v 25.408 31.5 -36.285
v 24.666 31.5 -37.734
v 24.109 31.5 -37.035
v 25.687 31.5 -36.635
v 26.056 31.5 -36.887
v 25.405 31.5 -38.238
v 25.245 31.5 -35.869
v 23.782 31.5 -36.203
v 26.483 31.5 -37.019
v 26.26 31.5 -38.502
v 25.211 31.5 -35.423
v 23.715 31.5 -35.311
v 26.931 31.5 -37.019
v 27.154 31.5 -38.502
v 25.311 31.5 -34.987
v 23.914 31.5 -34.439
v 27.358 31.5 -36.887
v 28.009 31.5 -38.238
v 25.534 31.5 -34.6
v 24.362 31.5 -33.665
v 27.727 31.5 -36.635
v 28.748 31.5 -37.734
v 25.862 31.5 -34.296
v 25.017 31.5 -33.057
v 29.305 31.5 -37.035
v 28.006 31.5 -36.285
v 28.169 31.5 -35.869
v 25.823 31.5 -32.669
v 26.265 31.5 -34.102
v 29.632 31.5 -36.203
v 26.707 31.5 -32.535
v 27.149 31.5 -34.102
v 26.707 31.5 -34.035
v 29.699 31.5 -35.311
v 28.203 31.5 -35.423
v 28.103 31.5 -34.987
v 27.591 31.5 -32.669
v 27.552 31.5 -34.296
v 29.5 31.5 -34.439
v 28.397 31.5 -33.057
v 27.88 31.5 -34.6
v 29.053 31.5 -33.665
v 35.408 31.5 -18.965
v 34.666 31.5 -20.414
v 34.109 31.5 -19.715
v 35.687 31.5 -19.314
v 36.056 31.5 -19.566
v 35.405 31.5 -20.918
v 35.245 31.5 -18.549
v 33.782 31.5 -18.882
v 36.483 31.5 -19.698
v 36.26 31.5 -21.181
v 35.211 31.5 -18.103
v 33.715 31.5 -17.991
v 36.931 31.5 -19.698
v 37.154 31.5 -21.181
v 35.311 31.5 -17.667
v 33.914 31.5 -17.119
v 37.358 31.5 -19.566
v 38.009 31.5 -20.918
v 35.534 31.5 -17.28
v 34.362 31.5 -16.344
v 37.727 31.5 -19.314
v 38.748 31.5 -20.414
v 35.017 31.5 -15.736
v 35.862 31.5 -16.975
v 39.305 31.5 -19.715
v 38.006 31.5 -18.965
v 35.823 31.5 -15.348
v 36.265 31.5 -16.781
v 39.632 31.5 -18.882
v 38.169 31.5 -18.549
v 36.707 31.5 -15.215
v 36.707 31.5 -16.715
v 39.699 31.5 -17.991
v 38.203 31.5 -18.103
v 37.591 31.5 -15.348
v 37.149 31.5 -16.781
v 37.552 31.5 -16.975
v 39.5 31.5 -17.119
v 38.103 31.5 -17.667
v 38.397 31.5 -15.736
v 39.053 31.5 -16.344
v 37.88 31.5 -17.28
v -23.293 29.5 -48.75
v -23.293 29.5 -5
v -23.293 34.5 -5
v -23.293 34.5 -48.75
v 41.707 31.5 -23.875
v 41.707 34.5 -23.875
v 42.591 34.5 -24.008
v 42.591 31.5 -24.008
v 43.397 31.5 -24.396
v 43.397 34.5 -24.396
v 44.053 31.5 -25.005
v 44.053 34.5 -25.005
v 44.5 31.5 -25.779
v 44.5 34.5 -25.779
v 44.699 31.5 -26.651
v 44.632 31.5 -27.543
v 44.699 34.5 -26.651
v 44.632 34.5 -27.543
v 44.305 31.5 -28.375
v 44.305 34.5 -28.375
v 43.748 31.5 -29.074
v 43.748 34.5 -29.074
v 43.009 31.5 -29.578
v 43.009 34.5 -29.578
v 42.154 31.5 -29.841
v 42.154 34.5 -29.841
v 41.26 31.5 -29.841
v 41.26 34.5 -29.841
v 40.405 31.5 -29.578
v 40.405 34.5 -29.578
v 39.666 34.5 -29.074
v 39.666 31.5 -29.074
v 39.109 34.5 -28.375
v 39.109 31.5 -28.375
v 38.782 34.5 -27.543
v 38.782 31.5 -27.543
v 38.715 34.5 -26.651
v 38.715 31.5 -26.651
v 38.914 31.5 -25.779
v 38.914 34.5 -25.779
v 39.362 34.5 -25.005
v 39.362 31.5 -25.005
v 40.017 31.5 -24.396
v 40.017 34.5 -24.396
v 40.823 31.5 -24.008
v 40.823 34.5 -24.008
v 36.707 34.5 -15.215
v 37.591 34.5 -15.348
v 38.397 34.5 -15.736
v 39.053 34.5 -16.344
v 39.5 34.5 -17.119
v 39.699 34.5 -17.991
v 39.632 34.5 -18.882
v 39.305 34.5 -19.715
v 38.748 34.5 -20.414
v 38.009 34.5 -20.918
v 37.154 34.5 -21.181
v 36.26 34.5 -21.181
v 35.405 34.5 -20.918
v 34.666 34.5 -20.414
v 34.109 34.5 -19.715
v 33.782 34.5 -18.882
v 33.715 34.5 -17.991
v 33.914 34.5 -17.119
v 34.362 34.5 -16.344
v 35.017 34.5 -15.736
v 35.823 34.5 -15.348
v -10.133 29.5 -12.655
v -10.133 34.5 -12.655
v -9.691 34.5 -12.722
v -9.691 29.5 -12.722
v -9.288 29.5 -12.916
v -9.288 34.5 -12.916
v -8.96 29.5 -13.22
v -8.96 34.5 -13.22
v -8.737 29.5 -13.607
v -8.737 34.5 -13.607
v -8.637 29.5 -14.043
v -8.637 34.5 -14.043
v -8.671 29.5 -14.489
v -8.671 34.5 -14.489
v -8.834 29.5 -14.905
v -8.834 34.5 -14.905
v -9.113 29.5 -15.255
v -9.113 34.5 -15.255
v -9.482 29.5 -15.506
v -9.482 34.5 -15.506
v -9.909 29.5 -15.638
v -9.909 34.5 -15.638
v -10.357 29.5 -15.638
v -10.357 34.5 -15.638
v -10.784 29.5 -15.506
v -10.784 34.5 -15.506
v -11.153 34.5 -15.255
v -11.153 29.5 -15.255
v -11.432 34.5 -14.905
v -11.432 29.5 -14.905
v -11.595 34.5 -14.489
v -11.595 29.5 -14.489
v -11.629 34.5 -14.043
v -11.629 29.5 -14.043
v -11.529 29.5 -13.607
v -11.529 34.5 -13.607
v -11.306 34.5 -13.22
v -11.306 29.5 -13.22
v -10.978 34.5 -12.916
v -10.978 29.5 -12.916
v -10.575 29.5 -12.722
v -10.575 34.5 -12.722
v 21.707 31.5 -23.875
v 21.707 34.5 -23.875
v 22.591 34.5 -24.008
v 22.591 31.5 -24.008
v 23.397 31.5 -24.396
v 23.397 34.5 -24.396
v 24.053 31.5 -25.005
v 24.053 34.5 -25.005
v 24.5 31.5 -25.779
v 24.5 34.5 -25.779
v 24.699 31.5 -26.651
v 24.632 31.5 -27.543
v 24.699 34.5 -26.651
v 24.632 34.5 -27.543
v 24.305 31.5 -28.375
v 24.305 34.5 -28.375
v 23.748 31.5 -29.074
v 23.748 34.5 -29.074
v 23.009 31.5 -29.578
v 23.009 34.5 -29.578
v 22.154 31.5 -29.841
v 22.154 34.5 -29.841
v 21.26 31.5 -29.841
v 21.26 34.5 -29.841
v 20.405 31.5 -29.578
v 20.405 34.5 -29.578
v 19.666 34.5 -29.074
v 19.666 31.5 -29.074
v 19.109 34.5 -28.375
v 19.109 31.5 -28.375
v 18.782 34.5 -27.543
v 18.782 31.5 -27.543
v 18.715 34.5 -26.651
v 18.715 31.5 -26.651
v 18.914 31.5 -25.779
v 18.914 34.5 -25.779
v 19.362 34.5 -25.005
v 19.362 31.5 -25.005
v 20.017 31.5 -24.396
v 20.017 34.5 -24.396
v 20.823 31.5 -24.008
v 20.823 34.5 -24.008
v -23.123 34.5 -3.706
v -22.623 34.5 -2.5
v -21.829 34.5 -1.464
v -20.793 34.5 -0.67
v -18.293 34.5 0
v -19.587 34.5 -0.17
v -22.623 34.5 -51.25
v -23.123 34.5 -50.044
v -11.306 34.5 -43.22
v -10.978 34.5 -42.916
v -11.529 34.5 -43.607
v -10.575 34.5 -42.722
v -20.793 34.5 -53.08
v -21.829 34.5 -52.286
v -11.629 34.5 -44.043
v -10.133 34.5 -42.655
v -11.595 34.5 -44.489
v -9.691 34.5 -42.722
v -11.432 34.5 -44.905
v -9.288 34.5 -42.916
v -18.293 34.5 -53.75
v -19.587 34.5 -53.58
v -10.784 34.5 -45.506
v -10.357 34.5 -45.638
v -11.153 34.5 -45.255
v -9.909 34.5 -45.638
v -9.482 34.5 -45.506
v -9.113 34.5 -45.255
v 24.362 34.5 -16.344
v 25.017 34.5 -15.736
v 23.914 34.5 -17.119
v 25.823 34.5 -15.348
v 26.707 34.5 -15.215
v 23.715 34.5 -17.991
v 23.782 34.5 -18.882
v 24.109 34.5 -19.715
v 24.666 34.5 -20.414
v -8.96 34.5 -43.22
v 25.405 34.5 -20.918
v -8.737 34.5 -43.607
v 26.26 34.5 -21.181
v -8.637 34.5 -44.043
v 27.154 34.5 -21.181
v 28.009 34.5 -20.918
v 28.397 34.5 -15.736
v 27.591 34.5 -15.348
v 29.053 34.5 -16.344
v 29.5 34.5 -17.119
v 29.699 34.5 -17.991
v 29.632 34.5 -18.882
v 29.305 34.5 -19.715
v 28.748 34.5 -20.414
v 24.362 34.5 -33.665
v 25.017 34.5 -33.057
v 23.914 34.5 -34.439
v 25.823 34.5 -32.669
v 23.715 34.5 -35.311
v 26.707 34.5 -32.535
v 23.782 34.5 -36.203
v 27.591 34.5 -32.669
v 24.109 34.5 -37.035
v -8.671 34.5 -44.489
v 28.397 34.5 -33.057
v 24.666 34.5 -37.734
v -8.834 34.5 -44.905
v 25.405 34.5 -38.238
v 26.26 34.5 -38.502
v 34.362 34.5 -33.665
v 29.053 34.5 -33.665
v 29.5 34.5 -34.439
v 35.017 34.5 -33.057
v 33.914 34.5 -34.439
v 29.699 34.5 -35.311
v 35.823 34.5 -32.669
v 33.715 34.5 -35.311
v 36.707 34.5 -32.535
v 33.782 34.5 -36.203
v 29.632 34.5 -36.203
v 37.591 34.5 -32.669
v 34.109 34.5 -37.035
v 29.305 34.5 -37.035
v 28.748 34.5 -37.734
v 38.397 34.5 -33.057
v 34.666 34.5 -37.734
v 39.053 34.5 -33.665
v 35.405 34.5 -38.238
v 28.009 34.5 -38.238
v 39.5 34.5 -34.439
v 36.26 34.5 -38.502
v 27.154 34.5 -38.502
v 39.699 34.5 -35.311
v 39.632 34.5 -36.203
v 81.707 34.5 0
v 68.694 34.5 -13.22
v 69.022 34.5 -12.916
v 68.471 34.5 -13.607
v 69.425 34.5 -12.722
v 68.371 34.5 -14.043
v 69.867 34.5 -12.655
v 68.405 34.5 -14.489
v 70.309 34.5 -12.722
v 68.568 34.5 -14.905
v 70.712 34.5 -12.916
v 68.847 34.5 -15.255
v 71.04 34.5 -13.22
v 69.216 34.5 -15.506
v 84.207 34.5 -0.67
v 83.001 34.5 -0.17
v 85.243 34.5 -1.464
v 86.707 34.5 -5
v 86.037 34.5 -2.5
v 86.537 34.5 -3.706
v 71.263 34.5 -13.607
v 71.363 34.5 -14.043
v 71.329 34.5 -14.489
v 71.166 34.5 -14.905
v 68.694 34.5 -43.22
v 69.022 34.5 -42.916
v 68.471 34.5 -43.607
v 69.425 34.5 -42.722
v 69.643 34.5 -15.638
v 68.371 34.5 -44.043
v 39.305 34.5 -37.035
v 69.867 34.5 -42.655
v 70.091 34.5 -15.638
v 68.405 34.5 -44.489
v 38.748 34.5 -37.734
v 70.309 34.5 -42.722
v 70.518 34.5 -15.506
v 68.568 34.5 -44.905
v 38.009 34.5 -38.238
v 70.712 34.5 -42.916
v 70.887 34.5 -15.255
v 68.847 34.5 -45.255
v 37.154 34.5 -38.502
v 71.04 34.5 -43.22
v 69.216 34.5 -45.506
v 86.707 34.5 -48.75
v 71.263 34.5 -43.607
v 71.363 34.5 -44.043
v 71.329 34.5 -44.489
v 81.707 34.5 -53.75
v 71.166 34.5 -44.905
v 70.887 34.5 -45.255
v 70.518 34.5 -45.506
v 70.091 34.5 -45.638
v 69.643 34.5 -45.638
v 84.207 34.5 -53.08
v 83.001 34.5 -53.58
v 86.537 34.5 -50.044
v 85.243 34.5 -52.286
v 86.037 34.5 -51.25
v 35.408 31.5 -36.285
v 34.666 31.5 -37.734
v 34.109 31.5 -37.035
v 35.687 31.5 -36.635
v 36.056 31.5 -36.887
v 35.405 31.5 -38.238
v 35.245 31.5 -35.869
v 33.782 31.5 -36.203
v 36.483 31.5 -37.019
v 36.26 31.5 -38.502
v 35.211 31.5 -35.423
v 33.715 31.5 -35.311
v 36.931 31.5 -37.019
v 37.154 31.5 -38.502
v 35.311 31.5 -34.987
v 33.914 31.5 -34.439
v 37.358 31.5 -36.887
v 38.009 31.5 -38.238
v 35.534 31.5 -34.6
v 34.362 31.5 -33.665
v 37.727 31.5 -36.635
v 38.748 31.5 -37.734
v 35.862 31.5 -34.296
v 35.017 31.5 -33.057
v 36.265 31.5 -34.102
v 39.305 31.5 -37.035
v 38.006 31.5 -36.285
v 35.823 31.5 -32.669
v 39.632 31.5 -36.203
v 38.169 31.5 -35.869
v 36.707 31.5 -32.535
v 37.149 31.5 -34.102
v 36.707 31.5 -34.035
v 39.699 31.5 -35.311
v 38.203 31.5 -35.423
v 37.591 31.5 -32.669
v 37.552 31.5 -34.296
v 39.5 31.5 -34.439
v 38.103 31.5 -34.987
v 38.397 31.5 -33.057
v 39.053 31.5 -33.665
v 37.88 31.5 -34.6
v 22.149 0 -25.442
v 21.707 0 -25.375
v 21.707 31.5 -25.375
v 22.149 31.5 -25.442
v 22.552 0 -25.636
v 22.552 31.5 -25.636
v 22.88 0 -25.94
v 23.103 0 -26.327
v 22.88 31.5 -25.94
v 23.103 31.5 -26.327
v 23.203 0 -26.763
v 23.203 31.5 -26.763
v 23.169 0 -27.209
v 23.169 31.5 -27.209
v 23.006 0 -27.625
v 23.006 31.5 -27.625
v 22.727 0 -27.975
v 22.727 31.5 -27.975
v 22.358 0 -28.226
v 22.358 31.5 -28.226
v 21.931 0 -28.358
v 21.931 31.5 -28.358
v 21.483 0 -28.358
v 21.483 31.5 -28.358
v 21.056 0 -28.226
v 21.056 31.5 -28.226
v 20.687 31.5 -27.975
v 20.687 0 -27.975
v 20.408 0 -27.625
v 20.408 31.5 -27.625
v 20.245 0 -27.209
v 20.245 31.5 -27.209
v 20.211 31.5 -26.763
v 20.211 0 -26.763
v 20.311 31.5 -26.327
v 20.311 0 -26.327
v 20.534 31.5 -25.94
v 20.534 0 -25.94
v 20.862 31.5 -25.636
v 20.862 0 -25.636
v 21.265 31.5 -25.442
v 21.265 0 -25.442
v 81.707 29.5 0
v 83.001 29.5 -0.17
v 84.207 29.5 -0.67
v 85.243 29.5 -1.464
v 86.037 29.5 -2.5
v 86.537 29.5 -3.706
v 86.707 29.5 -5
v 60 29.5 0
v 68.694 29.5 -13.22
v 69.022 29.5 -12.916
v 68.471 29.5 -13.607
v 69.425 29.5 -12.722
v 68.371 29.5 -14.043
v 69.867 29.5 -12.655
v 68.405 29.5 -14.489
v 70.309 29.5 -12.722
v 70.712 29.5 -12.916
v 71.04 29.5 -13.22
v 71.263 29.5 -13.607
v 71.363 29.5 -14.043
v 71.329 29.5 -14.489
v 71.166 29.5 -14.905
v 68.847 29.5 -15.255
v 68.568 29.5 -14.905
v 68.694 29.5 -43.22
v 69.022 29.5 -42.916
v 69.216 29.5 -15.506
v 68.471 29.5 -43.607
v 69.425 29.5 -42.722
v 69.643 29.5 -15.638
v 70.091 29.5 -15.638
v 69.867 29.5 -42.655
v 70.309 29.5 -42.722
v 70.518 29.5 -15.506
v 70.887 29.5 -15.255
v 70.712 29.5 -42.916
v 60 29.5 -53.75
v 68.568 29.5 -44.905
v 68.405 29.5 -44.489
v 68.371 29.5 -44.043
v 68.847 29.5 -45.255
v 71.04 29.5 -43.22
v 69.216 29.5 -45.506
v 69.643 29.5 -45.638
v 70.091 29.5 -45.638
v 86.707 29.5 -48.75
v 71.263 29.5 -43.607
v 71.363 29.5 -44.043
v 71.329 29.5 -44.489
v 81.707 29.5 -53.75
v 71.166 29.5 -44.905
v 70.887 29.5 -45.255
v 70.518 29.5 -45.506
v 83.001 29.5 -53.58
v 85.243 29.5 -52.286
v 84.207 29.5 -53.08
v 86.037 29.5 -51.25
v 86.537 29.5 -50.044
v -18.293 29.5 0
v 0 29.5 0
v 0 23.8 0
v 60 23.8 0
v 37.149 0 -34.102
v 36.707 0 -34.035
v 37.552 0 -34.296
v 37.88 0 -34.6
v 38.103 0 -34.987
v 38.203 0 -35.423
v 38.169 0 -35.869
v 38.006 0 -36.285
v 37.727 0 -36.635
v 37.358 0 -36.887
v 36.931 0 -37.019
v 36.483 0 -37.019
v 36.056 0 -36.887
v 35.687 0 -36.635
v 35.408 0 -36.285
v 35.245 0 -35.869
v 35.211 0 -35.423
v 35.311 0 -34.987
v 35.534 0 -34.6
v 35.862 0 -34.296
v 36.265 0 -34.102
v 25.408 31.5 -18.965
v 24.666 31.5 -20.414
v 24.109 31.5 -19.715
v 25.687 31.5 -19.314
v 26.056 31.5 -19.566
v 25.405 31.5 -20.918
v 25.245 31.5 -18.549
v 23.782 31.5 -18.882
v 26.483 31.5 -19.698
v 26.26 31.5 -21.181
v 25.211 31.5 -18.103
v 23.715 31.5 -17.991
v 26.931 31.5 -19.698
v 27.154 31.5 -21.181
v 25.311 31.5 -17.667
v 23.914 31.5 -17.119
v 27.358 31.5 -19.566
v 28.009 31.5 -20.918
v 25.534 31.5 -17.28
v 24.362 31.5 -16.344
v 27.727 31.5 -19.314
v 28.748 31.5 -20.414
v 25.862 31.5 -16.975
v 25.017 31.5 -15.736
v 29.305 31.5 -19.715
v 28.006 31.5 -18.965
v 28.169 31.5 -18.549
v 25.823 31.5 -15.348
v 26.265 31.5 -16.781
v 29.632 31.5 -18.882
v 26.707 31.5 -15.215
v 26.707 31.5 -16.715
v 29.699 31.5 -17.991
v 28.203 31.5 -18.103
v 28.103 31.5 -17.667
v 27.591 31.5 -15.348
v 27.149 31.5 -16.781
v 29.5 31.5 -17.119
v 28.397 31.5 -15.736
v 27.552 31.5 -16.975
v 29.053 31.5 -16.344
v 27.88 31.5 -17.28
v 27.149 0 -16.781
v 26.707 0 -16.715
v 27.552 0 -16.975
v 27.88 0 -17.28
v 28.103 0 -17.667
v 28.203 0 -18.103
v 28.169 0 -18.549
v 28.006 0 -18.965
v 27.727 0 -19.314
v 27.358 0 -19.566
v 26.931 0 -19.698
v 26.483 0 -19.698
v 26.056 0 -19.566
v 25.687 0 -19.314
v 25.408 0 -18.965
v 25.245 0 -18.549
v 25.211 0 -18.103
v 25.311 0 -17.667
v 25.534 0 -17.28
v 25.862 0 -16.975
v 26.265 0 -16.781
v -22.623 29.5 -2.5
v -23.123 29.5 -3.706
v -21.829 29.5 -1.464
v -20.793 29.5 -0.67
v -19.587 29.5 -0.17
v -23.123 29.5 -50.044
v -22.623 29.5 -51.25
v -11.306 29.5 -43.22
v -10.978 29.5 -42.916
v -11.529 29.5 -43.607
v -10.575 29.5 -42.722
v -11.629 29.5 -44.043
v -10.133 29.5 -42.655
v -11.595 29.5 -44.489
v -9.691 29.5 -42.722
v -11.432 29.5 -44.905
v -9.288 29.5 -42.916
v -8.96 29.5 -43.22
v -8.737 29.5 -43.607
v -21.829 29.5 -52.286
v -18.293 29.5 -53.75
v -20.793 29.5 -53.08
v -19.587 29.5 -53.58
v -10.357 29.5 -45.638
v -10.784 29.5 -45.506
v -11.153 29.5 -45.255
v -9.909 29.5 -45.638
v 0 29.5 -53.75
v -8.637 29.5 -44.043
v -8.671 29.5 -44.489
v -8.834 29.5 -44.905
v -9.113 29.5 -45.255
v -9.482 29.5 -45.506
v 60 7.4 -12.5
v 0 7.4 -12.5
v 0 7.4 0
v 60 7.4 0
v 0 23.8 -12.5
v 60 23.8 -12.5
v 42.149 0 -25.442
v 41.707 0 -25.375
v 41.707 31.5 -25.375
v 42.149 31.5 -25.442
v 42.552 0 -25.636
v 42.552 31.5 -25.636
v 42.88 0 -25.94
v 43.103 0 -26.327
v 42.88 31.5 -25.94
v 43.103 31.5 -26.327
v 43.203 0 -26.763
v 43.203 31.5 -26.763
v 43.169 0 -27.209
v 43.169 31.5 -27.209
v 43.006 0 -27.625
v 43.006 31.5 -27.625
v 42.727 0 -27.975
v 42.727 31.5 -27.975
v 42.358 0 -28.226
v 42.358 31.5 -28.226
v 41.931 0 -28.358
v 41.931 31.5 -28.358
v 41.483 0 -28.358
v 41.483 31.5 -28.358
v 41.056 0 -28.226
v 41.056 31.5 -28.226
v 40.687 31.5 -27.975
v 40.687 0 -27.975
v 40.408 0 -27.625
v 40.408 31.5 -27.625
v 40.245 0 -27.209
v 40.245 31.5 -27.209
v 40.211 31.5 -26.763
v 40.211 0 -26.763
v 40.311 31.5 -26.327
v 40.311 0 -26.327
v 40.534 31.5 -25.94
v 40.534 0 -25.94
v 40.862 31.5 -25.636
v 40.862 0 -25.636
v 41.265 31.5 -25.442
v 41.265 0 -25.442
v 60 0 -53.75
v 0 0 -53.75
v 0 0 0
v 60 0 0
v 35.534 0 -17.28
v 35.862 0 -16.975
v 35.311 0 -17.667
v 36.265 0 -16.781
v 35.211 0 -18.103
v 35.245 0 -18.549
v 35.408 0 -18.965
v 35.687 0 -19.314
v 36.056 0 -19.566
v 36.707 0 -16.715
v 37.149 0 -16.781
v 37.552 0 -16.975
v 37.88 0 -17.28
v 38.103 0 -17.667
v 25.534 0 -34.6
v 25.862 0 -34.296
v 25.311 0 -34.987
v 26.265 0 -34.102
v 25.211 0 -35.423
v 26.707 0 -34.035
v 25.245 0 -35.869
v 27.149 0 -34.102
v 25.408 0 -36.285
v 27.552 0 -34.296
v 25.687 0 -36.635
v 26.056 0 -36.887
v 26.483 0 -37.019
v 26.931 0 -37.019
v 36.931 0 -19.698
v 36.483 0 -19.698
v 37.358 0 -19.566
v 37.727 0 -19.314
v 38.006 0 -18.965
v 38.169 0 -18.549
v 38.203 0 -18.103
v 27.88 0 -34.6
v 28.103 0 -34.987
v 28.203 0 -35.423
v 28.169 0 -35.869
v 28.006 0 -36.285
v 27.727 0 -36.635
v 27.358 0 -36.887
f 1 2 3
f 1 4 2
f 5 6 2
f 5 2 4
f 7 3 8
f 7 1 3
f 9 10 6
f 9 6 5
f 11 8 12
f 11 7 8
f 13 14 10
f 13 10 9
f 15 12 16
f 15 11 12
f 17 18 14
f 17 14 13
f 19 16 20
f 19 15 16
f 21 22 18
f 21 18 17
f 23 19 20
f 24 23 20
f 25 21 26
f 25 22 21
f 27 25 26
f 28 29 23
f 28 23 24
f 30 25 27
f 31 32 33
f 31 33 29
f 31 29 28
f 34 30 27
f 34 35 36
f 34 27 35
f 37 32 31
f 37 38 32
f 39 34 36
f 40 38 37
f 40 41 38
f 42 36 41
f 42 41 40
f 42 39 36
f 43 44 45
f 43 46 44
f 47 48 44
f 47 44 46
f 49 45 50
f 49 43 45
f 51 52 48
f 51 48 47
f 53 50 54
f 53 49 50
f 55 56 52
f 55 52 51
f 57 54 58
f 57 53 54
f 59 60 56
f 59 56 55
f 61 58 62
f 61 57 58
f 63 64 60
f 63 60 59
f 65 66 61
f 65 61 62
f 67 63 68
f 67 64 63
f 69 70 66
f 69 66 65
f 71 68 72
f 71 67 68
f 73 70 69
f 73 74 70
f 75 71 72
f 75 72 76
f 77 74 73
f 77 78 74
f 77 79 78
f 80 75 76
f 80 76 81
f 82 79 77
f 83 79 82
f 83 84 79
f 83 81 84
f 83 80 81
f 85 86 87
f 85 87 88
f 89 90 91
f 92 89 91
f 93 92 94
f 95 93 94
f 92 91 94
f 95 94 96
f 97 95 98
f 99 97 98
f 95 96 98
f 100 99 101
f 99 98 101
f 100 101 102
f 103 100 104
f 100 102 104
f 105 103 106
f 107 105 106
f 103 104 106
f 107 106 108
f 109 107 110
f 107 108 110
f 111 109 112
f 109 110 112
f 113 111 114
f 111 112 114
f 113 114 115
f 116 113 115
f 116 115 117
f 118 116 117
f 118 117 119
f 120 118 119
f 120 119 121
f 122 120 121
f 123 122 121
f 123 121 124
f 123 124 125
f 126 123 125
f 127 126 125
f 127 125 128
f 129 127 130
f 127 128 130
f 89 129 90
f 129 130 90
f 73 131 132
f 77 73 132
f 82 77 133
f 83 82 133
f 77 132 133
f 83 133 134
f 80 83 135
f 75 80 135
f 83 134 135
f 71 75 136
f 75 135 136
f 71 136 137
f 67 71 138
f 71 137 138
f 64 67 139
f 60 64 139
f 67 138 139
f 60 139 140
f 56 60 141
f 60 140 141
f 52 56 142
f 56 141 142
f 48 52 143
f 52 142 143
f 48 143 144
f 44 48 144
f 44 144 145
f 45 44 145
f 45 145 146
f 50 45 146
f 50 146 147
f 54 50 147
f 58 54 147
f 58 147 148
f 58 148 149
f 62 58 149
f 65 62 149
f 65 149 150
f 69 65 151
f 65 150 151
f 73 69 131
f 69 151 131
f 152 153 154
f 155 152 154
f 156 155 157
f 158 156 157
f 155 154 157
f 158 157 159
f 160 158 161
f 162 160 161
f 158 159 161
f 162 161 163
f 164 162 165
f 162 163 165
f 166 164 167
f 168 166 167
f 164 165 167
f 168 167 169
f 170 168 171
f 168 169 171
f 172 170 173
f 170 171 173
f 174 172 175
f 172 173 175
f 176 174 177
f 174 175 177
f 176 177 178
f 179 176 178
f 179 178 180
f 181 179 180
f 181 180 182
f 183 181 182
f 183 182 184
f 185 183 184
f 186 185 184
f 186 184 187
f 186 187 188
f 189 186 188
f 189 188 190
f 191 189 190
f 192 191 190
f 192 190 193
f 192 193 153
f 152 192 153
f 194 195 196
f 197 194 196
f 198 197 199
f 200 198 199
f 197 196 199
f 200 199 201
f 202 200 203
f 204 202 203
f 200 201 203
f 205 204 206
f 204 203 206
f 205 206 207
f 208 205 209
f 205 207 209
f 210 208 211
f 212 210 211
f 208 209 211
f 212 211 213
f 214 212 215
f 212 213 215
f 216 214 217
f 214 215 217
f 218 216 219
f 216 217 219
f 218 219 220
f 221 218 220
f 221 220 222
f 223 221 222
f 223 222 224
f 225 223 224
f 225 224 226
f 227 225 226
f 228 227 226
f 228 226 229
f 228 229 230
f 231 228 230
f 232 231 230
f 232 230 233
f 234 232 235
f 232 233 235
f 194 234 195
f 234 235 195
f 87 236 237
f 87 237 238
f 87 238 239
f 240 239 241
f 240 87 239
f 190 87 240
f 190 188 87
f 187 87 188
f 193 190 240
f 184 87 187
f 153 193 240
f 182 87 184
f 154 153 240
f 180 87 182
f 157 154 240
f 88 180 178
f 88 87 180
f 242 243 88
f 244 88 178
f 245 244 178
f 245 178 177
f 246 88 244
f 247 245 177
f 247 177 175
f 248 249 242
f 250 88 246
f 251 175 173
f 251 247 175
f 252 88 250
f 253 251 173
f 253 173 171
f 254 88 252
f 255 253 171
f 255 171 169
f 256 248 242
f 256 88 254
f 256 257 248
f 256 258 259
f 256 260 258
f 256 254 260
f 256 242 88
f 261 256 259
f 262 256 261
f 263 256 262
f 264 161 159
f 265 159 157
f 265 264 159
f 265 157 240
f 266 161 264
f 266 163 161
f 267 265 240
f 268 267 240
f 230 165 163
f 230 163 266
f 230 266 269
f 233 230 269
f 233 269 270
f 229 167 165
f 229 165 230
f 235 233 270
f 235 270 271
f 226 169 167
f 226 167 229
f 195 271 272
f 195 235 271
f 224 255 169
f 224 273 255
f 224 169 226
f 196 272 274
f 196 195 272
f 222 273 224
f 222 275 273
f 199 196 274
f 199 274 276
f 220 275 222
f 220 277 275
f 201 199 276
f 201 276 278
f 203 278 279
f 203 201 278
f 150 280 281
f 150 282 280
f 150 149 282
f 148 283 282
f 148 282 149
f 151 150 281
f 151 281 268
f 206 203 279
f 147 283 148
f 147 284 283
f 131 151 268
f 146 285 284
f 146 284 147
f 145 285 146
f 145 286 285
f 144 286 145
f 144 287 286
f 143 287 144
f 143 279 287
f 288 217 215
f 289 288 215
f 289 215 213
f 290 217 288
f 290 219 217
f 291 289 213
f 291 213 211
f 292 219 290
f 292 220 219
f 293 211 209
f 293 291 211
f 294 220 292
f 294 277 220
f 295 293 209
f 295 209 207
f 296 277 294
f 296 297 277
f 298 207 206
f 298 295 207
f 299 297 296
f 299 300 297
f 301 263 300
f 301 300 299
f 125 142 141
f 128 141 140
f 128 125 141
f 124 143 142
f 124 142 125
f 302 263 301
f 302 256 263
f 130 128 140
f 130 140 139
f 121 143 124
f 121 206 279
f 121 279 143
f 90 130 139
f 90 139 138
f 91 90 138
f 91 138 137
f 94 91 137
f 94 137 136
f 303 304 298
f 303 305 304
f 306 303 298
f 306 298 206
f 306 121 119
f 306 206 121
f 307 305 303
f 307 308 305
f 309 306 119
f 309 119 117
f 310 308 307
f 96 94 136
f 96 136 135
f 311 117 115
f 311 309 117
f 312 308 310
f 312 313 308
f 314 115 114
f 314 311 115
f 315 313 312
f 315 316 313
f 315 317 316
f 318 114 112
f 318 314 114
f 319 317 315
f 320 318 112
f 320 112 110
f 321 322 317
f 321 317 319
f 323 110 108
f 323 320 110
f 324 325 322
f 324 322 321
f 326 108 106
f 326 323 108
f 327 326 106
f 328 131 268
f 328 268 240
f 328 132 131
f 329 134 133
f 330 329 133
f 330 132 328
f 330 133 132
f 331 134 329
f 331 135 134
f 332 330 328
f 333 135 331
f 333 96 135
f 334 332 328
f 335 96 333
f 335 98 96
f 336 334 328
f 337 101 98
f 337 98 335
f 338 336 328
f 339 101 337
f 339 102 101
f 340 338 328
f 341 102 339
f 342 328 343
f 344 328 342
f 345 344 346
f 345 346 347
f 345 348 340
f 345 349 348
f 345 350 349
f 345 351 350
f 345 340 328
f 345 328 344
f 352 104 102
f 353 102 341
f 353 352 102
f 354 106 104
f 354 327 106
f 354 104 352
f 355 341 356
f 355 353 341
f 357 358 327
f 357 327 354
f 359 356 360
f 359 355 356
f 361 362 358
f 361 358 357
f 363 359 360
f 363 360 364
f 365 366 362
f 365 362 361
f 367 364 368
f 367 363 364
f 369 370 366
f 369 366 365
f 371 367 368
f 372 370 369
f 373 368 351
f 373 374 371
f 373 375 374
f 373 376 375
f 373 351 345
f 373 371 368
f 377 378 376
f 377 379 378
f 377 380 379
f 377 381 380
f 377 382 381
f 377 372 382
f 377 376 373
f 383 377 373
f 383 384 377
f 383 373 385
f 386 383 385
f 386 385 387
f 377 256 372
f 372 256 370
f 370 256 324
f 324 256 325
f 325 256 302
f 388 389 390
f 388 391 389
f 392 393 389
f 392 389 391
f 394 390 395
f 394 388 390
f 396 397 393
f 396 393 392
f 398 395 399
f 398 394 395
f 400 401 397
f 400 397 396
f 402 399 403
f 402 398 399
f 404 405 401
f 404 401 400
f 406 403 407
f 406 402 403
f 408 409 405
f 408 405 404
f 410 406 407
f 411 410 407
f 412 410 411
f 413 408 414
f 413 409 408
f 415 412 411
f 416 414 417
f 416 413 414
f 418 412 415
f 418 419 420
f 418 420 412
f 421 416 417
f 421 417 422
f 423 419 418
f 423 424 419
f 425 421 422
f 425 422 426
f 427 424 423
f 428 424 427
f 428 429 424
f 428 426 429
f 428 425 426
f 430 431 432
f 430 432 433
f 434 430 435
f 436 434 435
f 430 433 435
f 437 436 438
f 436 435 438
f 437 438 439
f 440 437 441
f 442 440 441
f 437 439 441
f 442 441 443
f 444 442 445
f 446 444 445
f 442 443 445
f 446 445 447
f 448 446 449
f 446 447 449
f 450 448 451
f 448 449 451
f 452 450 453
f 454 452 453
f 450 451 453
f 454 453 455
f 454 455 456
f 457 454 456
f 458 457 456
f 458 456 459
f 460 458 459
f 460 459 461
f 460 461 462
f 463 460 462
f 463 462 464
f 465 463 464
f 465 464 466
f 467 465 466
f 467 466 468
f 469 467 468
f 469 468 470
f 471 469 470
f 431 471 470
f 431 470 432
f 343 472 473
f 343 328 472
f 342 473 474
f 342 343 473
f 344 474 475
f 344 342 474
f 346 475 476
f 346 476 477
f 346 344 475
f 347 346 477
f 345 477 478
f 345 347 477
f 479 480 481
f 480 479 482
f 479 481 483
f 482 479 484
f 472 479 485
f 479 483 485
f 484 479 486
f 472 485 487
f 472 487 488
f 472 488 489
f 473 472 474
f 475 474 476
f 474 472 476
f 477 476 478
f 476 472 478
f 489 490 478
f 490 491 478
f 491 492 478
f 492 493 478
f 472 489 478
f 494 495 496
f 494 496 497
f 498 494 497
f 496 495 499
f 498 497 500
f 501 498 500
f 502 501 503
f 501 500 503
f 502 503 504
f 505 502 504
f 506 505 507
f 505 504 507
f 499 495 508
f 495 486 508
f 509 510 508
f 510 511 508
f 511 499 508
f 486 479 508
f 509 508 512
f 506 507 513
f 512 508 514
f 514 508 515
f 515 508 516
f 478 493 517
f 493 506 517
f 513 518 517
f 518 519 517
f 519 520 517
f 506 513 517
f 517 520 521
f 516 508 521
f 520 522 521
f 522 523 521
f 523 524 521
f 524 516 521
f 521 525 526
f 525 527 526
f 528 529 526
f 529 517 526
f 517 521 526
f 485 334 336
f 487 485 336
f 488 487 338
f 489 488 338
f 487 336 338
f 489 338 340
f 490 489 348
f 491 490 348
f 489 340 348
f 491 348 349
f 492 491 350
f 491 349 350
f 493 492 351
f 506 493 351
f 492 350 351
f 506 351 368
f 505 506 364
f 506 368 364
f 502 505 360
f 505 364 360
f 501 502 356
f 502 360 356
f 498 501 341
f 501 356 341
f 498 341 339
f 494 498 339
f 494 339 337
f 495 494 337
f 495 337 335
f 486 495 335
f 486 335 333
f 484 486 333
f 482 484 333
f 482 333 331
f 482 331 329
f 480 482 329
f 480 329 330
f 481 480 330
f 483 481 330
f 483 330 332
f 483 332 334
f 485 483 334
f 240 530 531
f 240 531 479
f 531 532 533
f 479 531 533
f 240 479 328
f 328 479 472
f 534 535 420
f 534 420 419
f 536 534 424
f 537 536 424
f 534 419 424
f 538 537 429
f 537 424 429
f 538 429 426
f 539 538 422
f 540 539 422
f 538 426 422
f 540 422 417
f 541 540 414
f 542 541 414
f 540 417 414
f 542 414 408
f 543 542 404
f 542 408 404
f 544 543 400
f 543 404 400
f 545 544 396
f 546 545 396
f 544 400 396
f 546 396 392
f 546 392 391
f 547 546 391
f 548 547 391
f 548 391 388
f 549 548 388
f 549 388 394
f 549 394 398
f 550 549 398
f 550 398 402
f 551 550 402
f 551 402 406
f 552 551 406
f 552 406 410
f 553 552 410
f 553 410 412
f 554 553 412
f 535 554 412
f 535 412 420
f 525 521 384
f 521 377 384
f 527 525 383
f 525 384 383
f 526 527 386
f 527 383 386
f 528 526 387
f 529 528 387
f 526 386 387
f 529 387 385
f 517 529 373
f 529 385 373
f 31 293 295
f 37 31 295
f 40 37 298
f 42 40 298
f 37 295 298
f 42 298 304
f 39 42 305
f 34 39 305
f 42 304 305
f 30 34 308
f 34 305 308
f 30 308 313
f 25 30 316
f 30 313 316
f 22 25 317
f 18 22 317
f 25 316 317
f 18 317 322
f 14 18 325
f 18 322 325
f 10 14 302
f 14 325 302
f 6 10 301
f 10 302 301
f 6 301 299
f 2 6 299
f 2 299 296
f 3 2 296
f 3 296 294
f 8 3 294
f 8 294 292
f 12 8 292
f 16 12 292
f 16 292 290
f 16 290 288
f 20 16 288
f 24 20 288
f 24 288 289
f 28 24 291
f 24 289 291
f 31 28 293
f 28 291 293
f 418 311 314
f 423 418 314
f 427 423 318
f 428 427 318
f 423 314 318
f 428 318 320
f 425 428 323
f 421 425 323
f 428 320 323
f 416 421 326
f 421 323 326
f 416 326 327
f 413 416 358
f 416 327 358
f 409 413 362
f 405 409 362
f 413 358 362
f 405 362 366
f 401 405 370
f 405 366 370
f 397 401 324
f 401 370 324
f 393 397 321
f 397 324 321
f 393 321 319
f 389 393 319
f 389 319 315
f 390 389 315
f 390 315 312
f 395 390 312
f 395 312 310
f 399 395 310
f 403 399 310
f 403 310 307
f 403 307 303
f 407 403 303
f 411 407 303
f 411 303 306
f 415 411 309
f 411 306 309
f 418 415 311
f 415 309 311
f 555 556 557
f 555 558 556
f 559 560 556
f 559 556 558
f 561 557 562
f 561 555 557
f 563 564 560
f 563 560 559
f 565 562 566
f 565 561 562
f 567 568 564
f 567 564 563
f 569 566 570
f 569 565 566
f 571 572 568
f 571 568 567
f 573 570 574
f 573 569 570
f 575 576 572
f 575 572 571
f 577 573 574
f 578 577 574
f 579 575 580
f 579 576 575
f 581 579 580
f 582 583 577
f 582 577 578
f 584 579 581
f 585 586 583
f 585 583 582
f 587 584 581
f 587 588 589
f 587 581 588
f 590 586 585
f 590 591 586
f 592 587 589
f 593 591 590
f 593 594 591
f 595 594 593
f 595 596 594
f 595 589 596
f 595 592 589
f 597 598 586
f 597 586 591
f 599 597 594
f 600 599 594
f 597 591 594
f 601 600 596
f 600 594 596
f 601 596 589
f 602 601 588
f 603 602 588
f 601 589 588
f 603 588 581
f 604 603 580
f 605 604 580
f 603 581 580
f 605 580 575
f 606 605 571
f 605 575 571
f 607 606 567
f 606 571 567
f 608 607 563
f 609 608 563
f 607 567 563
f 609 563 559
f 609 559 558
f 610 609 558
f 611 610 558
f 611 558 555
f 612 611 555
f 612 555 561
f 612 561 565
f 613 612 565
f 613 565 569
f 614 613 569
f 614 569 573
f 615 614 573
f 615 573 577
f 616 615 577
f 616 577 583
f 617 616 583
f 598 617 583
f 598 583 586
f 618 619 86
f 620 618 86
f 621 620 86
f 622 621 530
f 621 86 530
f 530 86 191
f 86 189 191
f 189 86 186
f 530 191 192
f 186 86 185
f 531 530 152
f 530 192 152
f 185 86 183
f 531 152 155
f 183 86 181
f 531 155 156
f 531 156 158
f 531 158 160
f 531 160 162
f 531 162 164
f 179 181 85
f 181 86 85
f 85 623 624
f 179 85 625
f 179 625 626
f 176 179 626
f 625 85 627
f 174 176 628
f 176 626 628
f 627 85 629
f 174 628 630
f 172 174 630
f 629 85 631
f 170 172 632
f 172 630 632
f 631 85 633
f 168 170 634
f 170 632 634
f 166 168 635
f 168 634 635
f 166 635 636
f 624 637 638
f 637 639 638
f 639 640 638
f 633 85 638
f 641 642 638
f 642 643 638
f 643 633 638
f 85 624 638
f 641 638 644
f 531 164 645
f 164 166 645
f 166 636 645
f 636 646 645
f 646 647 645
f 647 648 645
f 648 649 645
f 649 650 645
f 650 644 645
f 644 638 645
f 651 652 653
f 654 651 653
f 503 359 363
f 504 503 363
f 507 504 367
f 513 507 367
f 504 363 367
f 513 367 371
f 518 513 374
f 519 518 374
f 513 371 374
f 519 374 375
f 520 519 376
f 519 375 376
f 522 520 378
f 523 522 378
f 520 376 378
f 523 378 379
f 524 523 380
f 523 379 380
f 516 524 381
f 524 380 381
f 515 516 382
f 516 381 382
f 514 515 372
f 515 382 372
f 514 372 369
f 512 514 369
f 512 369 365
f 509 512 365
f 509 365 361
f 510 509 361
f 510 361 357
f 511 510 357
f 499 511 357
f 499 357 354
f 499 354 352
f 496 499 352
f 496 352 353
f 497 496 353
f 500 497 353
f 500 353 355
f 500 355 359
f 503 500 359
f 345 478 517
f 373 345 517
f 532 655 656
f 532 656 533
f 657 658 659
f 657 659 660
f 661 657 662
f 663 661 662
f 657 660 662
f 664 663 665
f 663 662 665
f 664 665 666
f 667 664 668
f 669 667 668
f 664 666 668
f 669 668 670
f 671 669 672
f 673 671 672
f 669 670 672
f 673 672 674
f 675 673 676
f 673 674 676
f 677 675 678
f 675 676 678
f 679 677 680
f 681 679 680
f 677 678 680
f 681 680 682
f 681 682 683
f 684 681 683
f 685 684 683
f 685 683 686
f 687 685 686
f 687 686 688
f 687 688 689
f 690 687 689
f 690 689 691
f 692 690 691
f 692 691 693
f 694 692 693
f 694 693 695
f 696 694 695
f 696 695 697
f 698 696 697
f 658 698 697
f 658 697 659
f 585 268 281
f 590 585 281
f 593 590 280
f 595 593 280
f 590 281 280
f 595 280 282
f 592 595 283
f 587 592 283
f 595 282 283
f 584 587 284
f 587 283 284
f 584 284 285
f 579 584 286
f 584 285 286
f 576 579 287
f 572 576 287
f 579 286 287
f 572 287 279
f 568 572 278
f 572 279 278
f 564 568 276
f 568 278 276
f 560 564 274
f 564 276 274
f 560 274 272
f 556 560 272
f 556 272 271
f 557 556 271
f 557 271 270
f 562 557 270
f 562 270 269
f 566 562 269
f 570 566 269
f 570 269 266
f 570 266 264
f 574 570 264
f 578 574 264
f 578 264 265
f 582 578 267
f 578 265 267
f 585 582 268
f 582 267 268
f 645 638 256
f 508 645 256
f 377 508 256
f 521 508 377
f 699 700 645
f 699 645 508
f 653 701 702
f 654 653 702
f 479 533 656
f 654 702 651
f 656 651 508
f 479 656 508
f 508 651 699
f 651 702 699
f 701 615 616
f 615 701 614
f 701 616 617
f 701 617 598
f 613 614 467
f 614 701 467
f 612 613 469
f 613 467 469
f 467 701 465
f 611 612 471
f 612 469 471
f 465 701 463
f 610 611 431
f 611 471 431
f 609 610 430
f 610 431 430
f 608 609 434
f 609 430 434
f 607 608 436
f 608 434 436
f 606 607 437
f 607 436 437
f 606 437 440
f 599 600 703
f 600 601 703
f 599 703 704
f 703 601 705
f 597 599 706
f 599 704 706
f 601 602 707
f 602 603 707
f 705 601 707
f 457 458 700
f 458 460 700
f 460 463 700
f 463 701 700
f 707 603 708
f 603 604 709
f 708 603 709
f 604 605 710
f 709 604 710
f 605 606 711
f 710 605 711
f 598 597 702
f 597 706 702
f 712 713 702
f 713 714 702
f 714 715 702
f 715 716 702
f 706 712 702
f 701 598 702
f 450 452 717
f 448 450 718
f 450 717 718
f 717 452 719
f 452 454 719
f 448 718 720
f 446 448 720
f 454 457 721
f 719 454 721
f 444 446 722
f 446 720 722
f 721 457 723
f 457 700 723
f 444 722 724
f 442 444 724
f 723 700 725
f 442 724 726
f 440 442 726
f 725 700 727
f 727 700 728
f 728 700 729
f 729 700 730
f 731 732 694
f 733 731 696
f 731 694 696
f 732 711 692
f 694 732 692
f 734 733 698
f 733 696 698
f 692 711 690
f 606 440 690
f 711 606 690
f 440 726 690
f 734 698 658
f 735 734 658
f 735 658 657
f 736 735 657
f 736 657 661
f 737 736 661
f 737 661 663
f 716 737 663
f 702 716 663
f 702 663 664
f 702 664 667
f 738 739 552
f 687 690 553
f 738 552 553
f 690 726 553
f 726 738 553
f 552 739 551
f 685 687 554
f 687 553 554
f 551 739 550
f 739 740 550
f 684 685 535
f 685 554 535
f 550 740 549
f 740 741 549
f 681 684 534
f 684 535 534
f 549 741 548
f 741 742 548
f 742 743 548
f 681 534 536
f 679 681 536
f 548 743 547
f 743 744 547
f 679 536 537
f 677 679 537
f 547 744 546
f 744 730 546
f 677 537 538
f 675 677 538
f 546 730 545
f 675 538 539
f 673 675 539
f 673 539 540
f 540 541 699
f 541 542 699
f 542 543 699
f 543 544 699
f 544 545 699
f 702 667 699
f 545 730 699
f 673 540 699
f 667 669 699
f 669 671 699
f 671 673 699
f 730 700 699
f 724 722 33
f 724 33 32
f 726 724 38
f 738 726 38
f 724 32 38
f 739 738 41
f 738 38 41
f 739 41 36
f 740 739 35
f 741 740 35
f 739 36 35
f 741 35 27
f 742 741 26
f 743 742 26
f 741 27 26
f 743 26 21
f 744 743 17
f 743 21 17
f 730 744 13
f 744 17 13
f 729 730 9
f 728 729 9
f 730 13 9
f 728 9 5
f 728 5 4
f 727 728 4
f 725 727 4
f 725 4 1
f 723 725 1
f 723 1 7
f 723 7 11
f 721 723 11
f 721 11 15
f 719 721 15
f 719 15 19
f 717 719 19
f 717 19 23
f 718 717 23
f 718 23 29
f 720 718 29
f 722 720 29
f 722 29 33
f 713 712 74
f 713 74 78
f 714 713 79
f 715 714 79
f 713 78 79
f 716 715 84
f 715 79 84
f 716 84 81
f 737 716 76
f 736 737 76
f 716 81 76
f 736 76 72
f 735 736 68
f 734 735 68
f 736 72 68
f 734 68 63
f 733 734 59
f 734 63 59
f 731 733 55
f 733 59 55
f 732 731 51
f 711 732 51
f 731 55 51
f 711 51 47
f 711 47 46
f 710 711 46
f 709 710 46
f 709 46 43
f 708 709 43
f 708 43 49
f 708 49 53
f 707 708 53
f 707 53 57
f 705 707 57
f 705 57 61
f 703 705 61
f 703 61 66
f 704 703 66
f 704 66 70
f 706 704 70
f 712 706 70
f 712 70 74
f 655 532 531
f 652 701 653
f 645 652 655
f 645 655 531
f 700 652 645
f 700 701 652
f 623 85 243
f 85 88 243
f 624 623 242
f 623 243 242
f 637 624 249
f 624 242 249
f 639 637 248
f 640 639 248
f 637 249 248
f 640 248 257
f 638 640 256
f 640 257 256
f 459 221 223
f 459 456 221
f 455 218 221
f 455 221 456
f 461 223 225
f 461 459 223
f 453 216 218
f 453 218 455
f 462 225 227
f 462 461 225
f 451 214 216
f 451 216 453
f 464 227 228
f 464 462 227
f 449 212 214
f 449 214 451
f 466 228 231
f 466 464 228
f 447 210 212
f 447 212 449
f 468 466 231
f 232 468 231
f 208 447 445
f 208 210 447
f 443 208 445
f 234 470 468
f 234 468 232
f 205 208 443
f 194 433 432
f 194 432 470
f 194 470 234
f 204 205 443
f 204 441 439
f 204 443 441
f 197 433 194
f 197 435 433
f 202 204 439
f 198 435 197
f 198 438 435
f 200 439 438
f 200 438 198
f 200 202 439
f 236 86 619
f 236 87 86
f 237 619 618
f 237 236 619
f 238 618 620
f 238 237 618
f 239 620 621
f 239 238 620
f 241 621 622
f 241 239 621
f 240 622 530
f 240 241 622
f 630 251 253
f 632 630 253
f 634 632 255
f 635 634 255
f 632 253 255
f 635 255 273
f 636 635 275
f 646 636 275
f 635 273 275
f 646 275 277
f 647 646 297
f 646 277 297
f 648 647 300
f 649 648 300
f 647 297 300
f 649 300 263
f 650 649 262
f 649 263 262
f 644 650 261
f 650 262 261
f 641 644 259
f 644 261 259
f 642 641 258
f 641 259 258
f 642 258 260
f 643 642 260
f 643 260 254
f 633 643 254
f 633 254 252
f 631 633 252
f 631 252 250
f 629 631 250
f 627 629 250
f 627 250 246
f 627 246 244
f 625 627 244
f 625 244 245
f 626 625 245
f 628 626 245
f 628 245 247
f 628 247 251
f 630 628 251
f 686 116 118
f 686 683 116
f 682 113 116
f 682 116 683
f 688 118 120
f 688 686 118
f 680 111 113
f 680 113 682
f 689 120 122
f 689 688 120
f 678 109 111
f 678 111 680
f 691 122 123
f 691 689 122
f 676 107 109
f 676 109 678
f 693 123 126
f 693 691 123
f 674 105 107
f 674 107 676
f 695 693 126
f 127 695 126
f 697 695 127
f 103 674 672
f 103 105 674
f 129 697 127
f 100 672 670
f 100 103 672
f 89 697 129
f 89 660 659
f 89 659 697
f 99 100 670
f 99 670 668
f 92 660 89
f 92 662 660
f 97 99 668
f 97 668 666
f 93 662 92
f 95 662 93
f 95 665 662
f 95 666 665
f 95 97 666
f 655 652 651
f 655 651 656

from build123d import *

# Parameters (mm, degrees)
SKETCH1_W           = 60
SKETCH1_H           = 53.75
BOSS_EXTRUDE1_DEPTH = 29.5
SKETCH2_W           = 110
SKETCH2_H           = 53.75
BOSS_EXTRUDE3_DEPTH = 5
SKETCH3_W           = 12.5
SKETCH3_H           = 16.4
CUT_EXTRUDE1_DEPTH  = 108.691307363
SKETCH4_R           = 1.5
CUT_EXTRUDE2_DEPTH  = 108.691307363
SKETCH7_R           = 3
CUT_EXTRUDE3_DEPTH  = 3
SKETCH8_R           = 1.5
CUT_EXTRUDE4_DEPTH  = 108.691307363
FILLET1_R           = 5


with BuildPart() as part:
    # Sketch1 → Boss-Extrude1 (new body)
    with BuildSketch(Plane(origin=(0, 0, 0), x_dir=(1, 0, 0), z_dir=(0, 1, 0))):
        with Locations((30, 26.875)):
            Rectangle(SKETCH1_W, SKETCH1_H)
    extrude(amount=BOSS_EXTRUDE1_DEPTH)

    # Sketch2 → Boss-Extrude3 (add)
    with BuildSketch(Plane(origin=(0, 29.5, 0), x_dir=(1, 0, 0), z_dir=(0, 1, 0))):
        with Locations((31.707007684, 26.875)):
            Rectangle(SKETCH2_W, SKETCH2_H)
    extrude(amount=BOSS_EXTRUDE3_DEPTH)

    # Sketch3 → Cut-Extrude1 (cut, through all)
    with BuildSketch(Plane.ZY):
        with Locations((-6.25, 15.6)):
            Rectangle(SKETCH3_W, SKETCH3_H)
    extrude(amount=-CUT_EXTRUDE1_DEPTH, mode=Mode.SUBTRACT)

    # Sketch4 → Cut-Extrude2 (cut, through all)
    with BuildSketch(Plane(origin=(0, 34.5, 0), x_dir=(1, 0, 0), z_dir=(0, 1, 0))):
        with Locations(Location((-10.132992316, 14.155, 0), (0, 0, 270))):
            Circle(SKETCH4_R)
        with Locations(Location((69.867007684, 14.155, 0), (0, 0, 270))):
            Circle(SKETCH4_R)
        with Locations(Location((-10.132992316, 44.155, 0), (0, 0, 270))):
            Circle(SKETCH4_R)
        with Locations(Location((69.867007684, 44.155, 0), (0, 0, 270))):
            Circle(SKETCH4_R)
    extrude(amount=-CUT_EXTRUDE2_DEPTH, mode=Mode.SUBTRACT)

    # Sketch7 → Cut-Extrude3 (cut)
    with BuildSketch(Plane(origin=(0, 34.5, 0), x_dir=(1, 0, 0), z_dir=(0, 1, 0))):
        with Locations(Location((41.707007684, 26.875, 0), (0, 0, 270))):
            Circle(SKETCH7_R)
        with Locations(Location((36.707007684, 18.214745962, 0), (0, 0, 270))):
            Circle(SKETCH7_R)
        with Locations(Location((26.707007684, 18.214745962, 0), (0, 0, 270))):
            Circle(SKETCH7_R)
        with Locations(Location((21.707007684, 26.875, 0), (0, 0, 270))):
            Circle(SKETCH7_R)
        with Locations(Location((26.707007684, 35.535254038, 0), (0, 0, 270))):
            Circle(SKETCH7_R)
        with Locations(Location((36.707007684, 35.535254038, 0), (0, 0, 270))):
            Circle(SKETCH7_R)
    extrude(amount=-CUT_EXTRUDE3_DEPTH, mode=Mode.SUBTRACT)

    # Sketch8 → Cut-Extrude4 (cut, through all)
    with BuildSketch(Plane(origin=(0, 34.5, 0), x_dir=(1, 0, 0), z_dir=(0, 1, 0))):
        with Locations(Location((41.707007684, 26.875, 0), (0, 0, 270))):
            Circle(SKETCH8_R)
        with Locations(Location((36.707007684, 18.214745962, 0), (0, 0, 270))):
            Circle(SKETCH8_R)
        with Locations(Location((26.707007684, 18.214745962, 0), (0, 0, 270))):
            Circle(SKETCH8_R)
        with Locations(Location((21.707007684, 26.875, 0), (0, 0, 270))):
            Circle(SKETCH8_R)
        with Locations(Location((26.707007684, 35.535254038, 0), (0, 0, 270))):
            Circle(SKETCH8_R)
        with Locations(Location((36.707007684, 35.535254038, 0), (0, 0, 270))):
            Circle(SKETCH8_R)
    extrude(amount=-CUT_EXTRUDE4_DEPTH, mode=Mode.SUBTRACT)

    # Fillet1
    fillet1_edges = [part.edges().sort_by_distance(p)[0] for p in [
        (-23.292992316, 32, -53.75),
        (-23.292992316, 32, 0),
        (86.707007684, 32, 0),
        (86.707007684, 32, -53.75),
    ]]
    fillet(fillet1_edges, radius=FILLET1_R)


solid = part.part
